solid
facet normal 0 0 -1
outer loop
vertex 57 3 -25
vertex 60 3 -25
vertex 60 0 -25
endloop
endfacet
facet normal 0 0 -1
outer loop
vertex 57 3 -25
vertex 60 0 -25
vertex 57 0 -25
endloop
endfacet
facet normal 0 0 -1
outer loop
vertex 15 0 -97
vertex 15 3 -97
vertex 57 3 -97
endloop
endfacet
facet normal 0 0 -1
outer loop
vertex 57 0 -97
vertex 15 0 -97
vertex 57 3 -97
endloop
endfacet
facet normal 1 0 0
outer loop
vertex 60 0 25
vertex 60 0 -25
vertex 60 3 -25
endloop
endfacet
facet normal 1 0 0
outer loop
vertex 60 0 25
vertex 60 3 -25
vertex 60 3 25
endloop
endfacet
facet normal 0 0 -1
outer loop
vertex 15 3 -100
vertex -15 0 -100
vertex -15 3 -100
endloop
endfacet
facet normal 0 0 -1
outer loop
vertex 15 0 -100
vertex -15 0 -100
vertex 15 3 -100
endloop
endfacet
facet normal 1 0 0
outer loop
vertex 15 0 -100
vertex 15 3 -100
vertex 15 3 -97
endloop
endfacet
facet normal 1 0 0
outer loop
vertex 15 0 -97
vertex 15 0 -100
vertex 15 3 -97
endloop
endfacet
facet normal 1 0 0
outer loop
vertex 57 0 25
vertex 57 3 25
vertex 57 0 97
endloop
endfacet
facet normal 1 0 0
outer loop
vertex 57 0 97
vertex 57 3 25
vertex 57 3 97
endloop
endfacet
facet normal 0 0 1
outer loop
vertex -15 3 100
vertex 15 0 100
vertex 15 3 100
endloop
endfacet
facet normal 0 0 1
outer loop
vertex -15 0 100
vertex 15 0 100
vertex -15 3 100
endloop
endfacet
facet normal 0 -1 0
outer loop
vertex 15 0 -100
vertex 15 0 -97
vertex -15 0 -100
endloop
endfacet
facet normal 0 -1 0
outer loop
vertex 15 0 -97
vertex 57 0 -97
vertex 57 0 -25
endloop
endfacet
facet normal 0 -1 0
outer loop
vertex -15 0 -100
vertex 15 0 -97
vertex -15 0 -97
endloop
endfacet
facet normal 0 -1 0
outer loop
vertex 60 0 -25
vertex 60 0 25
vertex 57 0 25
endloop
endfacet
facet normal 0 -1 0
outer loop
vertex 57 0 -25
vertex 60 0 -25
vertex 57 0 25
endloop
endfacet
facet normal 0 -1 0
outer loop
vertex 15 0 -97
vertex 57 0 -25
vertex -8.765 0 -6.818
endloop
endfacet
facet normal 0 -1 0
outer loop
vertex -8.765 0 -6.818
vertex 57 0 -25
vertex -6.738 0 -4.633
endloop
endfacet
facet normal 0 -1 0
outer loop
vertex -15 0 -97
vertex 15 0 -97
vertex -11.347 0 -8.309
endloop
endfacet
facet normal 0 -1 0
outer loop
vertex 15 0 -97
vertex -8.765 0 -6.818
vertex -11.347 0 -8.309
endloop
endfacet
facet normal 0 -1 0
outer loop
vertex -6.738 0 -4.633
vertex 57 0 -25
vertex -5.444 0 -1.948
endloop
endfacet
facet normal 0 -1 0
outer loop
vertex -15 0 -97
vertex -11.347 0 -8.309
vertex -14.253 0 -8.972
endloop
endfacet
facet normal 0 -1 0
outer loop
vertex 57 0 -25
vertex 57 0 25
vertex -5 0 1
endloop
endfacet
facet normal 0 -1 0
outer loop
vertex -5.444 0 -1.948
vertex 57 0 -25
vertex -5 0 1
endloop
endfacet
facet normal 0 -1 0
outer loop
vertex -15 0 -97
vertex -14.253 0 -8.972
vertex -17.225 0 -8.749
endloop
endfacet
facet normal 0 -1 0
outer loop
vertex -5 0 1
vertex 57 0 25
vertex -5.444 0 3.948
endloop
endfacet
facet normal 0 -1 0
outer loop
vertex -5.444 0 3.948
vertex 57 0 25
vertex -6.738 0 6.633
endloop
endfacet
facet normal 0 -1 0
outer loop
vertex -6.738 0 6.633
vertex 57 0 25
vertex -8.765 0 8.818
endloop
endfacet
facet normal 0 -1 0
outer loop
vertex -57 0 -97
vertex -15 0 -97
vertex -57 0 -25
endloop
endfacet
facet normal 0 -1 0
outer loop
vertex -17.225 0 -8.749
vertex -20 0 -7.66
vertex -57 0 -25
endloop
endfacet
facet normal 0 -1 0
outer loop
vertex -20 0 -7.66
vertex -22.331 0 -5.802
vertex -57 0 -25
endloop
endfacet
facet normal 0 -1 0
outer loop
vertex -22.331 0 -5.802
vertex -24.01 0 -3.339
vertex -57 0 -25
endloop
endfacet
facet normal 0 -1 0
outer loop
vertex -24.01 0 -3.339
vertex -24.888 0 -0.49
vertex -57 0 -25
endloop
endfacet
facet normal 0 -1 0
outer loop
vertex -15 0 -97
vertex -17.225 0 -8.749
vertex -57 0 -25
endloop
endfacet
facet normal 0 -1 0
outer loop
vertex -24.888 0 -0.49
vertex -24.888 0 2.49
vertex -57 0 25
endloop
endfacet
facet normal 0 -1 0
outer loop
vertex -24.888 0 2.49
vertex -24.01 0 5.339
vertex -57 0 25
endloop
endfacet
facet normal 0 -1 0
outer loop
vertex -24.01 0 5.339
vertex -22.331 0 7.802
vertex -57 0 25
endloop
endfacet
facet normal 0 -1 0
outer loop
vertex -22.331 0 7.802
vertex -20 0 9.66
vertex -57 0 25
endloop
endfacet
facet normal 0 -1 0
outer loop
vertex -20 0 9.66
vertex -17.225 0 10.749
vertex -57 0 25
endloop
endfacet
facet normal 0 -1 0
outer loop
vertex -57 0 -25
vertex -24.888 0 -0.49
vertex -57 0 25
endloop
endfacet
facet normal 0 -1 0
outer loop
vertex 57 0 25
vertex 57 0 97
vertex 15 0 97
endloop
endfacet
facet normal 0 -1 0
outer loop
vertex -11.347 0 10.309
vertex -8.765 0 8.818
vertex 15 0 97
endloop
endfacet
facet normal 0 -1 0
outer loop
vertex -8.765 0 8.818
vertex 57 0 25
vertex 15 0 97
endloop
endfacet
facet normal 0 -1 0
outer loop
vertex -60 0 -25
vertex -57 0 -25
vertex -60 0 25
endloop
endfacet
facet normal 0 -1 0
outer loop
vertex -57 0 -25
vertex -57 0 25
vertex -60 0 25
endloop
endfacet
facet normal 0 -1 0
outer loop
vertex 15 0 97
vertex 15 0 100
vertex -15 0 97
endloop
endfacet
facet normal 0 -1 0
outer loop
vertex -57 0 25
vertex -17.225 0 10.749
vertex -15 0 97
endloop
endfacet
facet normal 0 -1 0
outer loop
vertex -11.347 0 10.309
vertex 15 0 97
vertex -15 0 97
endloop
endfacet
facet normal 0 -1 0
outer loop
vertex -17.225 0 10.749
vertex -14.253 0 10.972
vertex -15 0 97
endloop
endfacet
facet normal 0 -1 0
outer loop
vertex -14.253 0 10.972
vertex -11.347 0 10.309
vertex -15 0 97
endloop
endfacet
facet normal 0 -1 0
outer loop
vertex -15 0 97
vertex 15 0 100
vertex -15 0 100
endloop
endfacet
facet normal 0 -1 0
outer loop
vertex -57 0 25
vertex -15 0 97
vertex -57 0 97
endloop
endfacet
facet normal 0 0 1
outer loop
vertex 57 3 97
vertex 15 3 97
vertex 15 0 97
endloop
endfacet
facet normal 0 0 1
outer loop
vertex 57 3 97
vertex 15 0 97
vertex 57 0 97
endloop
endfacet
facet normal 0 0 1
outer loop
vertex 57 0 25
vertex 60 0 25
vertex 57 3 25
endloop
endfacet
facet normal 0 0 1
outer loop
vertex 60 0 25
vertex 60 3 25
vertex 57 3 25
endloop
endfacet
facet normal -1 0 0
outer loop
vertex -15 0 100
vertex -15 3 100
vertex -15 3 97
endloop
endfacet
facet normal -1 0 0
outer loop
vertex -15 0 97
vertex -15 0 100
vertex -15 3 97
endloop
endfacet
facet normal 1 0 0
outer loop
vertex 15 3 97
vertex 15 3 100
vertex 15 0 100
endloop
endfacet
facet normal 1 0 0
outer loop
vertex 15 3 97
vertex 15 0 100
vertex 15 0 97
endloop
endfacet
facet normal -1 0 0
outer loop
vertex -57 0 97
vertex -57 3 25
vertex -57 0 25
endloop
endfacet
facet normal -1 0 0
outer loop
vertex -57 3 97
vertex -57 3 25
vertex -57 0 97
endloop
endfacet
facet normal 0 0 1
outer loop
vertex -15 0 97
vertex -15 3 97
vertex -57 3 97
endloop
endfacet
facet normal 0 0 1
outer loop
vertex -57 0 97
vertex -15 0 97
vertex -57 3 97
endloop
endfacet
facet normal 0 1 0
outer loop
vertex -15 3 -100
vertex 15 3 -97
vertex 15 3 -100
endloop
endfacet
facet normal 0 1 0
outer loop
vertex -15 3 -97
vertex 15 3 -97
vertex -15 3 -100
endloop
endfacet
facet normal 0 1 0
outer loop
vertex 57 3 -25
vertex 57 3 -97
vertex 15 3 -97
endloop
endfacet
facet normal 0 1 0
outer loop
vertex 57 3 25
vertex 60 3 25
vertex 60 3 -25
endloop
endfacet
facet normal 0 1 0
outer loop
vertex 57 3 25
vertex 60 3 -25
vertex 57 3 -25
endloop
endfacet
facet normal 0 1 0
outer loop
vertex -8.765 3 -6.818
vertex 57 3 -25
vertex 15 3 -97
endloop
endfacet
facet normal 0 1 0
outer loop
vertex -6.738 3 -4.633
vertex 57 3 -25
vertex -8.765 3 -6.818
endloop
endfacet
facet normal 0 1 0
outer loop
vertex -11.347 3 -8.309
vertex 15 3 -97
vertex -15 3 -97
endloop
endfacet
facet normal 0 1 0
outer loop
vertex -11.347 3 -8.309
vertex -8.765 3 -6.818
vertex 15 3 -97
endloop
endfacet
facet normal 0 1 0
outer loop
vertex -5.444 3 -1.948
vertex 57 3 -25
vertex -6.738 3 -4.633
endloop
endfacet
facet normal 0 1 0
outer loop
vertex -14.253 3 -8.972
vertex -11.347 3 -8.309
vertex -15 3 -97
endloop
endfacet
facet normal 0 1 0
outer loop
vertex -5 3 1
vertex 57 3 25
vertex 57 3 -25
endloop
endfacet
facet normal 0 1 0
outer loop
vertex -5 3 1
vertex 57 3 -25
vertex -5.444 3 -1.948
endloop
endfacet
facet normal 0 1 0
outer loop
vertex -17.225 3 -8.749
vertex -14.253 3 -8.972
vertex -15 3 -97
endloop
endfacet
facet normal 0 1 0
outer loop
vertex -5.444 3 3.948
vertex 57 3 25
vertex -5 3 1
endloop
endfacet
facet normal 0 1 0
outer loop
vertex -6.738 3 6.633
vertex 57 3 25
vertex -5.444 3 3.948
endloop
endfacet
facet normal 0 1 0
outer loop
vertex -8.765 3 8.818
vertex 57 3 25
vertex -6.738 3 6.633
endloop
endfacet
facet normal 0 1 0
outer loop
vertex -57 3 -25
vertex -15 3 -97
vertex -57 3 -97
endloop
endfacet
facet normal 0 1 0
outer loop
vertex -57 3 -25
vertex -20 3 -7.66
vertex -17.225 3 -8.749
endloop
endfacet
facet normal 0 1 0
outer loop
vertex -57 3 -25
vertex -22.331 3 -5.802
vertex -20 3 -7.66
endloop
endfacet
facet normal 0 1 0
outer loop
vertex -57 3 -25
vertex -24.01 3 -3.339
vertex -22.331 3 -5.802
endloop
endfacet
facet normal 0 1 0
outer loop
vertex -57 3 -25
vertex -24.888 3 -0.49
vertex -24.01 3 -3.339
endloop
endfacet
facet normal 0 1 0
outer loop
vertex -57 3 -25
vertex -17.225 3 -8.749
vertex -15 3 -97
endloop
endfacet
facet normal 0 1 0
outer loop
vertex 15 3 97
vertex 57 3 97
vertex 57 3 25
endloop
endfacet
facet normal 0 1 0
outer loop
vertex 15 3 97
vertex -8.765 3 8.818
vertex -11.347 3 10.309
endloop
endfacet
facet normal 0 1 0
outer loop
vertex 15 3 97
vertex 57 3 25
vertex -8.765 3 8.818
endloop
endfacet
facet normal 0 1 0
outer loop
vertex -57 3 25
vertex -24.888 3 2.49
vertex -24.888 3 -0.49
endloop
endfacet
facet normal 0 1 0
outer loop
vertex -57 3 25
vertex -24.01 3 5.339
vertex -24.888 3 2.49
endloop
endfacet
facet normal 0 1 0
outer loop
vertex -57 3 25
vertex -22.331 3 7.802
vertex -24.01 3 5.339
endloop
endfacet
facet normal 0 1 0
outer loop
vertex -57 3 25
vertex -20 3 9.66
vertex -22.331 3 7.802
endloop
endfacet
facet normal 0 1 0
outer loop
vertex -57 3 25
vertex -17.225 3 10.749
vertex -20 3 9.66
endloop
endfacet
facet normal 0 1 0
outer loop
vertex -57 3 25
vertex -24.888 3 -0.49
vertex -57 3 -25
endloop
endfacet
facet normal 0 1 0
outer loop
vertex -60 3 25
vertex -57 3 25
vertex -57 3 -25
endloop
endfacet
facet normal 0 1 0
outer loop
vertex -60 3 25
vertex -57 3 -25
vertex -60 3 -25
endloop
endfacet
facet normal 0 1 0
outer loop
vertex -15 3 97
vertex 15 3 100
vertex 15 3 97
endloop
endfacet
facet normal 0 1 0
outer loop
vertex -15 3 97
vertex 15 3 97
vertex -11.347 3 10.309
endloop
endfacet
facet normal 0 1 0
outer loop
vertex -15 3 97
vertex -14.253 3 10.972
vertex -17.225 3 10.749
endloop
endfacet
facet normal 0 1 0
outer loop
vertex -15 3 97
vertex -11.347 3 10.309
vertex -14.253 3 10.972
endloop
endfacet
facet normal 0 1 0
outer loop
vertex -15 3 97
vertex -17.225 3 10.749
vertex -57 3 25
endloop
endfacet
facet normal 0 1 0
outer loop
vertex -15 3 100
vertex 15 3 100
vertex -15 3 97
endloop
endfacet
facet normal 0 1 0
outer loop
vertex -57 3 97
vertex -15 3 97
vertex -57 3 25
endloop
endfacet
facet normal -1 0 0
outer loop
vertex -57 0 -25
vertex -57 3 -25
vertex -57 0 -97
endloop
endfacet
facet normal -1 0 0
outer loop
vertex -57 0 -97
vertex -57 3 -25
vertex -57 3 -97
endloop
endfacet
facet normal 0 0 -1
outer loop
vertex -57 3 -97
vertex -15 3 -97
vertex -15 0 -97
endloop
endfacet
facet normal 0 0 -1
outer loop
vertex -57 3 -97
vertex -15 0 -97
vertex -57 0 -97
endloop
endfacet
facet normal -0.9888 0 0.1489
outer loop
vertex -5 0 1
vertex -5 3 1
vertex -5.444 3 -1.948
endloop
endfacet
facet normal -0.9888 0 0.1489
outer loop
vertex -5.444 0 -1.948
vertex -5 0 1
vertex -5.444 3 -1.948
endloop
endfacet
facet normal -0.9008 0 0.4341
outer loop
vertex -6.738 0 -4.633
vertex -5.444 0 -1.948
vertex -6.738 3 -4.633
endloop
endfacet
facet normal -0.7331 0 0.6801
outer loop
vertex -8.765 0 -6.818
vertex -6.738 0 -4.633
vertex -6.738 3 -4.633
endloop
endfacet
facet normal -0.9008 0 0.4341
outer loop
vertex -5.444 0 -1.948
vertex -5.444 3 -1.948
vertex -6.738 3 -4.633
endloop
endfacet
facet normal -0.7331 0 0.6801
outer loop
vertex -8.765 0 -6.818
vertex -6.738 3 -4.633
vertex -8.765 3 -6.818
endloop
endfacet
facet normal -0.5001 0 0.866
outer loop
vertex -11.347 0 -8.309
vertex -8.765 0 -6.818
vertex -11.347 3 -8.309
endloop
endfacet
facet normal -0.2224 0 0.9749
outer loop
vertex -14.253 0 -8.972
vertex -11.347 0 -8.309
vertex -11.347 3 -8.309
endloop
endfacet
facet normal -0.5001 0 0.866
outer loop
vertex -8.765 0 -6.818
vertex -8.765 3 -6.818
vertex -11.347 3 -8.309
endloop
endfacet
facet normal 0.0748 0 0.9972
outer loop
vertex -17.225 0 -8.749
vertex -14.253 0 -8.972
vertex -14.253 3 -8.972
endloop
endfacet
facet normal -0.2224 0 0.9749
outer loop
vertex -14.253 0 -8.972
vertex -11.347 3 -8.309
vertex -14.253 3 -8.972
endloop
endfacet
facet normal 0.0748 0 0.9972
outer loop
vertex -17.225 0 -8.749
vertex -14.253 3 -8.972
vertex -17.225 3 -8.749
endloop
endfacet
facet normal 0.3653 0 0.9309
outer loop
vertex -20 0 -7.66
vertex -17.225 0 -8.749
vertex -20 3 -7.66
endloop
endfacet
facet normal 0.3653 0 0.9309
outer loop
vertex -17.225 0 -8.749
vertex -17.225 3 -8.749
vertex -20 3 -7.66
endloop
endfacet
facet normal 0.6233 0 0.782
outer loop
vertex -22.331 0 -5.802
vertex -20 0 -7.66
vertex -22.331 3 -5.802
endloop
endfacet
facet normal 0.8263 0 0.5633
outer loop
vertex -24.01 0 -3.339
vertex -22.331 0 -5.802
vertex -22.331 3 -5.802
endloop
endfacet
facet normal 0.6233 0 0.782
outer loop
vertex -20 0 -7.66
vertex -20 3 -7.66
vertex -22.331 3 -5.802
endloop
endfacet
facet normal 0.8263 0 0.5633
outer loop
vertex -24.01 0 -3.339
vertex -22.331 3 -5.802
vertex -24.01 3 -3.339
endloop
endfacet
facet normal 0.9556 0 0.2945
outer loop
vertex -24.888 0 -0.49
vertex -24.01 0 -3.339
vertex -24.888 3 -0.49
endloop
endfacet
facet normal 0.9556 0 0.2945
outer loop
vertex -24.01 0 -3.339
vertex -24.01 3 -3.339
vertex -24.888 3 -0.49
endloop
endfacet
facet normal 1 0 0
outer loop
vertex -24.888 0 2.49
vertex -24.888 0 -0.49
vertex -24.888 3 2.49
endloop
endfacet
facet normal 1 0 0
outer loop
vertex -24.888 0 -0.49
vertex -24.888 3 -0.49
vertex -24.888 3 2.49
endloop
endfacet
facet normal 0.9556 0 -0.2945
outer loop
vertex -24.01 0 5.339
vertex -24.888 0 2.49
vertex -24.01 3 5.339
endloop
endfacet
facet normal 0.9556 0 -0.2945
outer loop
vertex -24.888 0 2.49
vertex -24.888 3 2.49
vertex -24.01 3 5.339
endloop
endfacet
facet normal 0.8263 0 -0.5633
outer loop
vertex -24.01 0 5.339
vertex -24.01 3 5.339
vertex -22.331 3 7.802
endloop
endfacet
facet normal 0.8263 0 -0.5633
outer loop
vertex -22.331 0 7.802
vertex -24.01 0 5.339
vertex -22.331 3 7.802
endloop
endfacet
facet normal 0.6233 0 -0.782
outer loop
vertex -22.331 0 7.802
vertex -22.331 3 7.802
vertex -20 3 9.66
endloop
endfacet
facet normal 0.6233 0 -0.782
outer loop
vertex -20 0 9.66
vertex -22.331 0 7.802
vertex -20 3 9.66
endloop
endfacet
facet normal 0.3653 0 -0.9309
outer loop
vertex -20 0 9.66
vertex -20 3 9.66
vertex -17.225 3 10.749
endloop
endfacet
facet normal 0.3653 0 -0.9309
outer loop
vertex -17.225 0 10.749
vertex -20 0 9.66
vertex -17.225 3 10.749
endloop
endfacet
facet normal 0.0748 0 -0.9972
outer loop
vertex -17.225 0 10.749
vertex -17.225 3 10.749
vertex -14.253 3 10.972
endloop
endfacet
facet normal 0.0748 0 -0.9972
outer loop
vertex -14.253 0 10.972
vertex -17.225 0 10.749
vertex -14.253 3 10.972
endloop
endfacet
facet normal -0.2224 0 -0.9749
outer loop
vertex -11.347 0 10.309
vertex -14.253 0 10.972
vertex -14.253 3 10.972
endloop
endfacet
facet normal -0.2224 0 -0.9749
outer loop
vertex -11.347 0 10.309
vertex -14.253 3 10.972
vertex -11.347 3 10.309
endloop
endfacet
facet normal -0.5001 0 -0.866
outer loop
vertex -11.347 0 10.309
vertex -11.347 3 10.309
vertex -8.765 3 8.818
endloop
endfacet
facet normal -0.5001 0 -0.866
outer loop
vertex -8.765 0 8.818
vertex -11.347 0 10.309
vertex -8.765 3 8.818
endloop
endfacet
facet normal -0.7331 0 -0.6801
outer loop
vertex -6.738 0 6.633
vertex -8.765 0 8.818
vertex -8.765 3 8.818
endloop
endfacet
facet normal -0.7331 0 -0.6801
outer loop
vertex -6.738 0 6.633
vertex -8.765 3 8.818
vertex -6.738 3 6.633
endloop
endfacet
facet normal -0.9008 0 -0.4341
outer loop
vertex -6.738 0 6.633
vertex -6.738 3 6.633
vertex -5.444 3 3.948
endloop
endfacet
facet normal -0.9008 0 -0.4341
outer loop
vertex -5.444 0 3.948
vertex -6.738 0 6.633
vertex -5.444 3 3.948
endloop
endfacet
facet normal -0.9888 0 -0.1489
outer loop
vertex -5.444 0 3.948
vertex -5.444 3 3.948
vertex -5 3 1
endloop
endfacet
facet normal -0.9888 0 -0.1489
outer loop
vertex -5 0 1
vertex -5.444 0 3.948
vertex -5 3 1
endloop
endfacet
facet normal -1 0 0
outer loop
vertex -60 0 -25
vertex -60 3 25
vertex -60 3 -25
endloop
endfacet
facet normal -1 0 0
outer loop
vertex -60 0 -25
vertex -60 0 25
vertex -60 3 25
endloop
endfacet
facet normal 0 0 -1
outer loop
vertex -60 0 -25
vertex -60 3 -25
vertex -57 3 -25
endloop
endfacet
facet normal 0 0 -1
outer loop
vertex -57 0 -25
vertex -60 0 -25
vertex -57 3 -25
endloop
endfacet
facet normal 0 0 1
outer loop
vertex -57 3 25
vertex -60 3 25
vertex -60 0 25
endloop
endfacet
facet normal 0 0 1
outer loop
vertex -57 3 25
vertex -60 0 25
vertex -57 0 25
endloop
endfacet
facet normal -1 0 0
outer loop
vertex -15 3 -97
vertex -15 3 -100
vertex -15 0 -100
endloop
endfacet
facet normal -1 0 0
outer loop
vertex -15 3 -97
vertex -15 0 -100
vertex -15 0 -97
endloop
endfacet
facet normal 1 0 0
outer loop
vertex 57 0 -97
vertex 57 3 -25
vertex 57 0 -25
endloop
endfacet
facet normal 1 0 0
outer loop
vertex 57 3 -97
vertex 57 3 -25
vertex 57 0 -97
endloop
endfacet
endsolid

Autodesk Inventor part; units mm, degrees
ref_plane "YZ Plane" through (0, 0, 0) normal (1, 0, 0) x (0, 1, 0)
ref_plane "XZ Plane" through (0, 0, 0) normal (0, 1, 0) x (-1, 0, 0)
ref_plane "XY Plane" through (0, 0, 0) normal (0, 0, 1) x (1, 0, 0)
sketch "스케치1" plane through (0, 0, 0) normal (0, 1, 0) x (-1, 0, 0)
  line L0 (-60, 100) -> (60, 100)
  line L1 (60, 100) -> (60, -100)
  line L2 (60, -100) -> (-60, -100)
  line L3 (-60, -100) -> (-60, 100)
  line L4 (-60, 100) -> (60, -100) construction
  line L5 (60, 100) -> (-60, -100) construction
  point P0 (0, 0)
  dimension "d0" = 200
  dimension "d1" = 120
extrude "돌출1" add sketch "스케치1" along normal blind 3
sketch "스케치2" plane through (0, 3, 0) normal (0, 1, 0) x (1, 0, 0)
  circle A0 centre (-15, -1) radius 10
  line L0 (-60, 100) -> (-60, -100) projected
  line L1 (60, 100) -> (-60, 100) projected
  point P0 (0, 0)
  dimension "d4" = 20
  dimension "d5" = 45
  dimension "d6" = 101
extrude "돌출2" cut sketch "스케치2" against normal through all
sketch "스케치3" plane through (0, 3, 0) normal (0, 1, 0) x (1, 0, 0)
  line L0 (-60, 25) -> (-57, 25)
  line L1 (-57, 25) -> (-57, 100)
  line L2 (-57, 100) -> (-60, 100)
  line L3 (-60, 100) -> (-60, 25)
  line L4 (-60, 100) -> (-60, -100) projected
  line L5 (60, 100) -> (-60, 100) projected
  line L6 (-60, 100) -> (-60, -100) projected
  line L7 (-60, 0) -> (60, 0)
  line L8 (60, -100) -> (60, 100) projected
  line L9 (60, 100) -> (-60, 100) projected
  line L10 (0, 100) -> (0, -100)
  line L11 (-60, -100) -> (60, -100) projected
  line L12 (-60, -25) -> (-57, -25)
  line L13 (-57, -25) -> (-57, -100)
  line L14 (-57, -100) -> (-60, -100)
  line L15 (-60, -100) -> (-60, -25)
  line L16 (60, 25) -> (57, 25)
  line L17 (57, 25) -> (57, 100)
  line L18 (57, 100) -> (60, 100)
  line L19 (60, 100) -> (60, 25)
  line L20 (60, 100) -> (60, -100)
  line L21 (60, 100) -> (60, -100)
  line L22 (60, -25) -> (57, -25)
  line L23 (57, -25) -> (57, -100)
  line L24 (57, -100) -> (60, -100)
  line L25 (60, -100) -> (60, -25)
  point P0 (0, 0)
  point P1 (-60, -100)
  point P2 (60, -100)
  point P3 (60, 25)
  point P4 (60, -25)
  point P5 (-60, -25)
  dimension "d9" = 75
  dimension "d10" = 3
extrude "돌출3" cut sketch "스케치3" against normal through all contours L3 L2 L1 L0 | L12 L13 L11 L4 | L5 L8 L16 L17 | L8 L11 L23 L22
sketch "스케치4" plane through (0, 3, 0) normal (0, 1, 0) x (1, 0, 0)
  line L0 (-57, -100) -> (57, -100) projected
  line L1 (57, -100) -> (15, -100)
  line L2 (15, -100) -> (15, -97)
  line L3 (15, -97) -> (57, -97)
  line L4 (57, -97) -> (57, -100)
  line L5 (0, -100) -> (0, 100)
  line L6 (57, 100) -> (-57, 100) projected
  line L7 (-59.774, 0) -> (60, 0)
  line L8 (60, -25) -> (60, 25) projected
  line L9 (57, 100) -> (15, 100)
  line L10 (15, 100) -> (15, 97)
  line L11 (15, 97) -> (57, 97)
  line L12 (57, 97) -> (57, 100)
  line L13 (-57, -100) -> (-15, -100)
  line L14 (-15, -100) -> (-15, -97)
  line L15 (-15, -97) -> (-57, -97)
  line L16 (-57, -97) -> (-57, -100)
  line L17 (-57, 100) -> (-15, 100)
  line L18 (-15, 100) -> (-15, 97)
  line L19 (-15, 97) -> (-57, 97)
  line L20 (-57, 97) -> (-57, 100)
  point P0 (0, 0)
  point P1 (-15, 100)
  point P2 (15, 100)
  point P3 (-15, -100)
  dimension "d13" = 3
  dimension "d14" = 42
extrude "돌출4" cut sketch "스케치4" against normal through all
sketch "스케치5" plane through (0, 3, 0) normal (0, 1, 0) x (1, 0, 0)
  point P0 (0, 0)
sketch "스케치6" plane through (0, 3, 0) normal (0, 1, 0) x (1, 0, 0)
  point P0 (0, 0)
properties part number "본체 뚜껑 레이저 수정"
